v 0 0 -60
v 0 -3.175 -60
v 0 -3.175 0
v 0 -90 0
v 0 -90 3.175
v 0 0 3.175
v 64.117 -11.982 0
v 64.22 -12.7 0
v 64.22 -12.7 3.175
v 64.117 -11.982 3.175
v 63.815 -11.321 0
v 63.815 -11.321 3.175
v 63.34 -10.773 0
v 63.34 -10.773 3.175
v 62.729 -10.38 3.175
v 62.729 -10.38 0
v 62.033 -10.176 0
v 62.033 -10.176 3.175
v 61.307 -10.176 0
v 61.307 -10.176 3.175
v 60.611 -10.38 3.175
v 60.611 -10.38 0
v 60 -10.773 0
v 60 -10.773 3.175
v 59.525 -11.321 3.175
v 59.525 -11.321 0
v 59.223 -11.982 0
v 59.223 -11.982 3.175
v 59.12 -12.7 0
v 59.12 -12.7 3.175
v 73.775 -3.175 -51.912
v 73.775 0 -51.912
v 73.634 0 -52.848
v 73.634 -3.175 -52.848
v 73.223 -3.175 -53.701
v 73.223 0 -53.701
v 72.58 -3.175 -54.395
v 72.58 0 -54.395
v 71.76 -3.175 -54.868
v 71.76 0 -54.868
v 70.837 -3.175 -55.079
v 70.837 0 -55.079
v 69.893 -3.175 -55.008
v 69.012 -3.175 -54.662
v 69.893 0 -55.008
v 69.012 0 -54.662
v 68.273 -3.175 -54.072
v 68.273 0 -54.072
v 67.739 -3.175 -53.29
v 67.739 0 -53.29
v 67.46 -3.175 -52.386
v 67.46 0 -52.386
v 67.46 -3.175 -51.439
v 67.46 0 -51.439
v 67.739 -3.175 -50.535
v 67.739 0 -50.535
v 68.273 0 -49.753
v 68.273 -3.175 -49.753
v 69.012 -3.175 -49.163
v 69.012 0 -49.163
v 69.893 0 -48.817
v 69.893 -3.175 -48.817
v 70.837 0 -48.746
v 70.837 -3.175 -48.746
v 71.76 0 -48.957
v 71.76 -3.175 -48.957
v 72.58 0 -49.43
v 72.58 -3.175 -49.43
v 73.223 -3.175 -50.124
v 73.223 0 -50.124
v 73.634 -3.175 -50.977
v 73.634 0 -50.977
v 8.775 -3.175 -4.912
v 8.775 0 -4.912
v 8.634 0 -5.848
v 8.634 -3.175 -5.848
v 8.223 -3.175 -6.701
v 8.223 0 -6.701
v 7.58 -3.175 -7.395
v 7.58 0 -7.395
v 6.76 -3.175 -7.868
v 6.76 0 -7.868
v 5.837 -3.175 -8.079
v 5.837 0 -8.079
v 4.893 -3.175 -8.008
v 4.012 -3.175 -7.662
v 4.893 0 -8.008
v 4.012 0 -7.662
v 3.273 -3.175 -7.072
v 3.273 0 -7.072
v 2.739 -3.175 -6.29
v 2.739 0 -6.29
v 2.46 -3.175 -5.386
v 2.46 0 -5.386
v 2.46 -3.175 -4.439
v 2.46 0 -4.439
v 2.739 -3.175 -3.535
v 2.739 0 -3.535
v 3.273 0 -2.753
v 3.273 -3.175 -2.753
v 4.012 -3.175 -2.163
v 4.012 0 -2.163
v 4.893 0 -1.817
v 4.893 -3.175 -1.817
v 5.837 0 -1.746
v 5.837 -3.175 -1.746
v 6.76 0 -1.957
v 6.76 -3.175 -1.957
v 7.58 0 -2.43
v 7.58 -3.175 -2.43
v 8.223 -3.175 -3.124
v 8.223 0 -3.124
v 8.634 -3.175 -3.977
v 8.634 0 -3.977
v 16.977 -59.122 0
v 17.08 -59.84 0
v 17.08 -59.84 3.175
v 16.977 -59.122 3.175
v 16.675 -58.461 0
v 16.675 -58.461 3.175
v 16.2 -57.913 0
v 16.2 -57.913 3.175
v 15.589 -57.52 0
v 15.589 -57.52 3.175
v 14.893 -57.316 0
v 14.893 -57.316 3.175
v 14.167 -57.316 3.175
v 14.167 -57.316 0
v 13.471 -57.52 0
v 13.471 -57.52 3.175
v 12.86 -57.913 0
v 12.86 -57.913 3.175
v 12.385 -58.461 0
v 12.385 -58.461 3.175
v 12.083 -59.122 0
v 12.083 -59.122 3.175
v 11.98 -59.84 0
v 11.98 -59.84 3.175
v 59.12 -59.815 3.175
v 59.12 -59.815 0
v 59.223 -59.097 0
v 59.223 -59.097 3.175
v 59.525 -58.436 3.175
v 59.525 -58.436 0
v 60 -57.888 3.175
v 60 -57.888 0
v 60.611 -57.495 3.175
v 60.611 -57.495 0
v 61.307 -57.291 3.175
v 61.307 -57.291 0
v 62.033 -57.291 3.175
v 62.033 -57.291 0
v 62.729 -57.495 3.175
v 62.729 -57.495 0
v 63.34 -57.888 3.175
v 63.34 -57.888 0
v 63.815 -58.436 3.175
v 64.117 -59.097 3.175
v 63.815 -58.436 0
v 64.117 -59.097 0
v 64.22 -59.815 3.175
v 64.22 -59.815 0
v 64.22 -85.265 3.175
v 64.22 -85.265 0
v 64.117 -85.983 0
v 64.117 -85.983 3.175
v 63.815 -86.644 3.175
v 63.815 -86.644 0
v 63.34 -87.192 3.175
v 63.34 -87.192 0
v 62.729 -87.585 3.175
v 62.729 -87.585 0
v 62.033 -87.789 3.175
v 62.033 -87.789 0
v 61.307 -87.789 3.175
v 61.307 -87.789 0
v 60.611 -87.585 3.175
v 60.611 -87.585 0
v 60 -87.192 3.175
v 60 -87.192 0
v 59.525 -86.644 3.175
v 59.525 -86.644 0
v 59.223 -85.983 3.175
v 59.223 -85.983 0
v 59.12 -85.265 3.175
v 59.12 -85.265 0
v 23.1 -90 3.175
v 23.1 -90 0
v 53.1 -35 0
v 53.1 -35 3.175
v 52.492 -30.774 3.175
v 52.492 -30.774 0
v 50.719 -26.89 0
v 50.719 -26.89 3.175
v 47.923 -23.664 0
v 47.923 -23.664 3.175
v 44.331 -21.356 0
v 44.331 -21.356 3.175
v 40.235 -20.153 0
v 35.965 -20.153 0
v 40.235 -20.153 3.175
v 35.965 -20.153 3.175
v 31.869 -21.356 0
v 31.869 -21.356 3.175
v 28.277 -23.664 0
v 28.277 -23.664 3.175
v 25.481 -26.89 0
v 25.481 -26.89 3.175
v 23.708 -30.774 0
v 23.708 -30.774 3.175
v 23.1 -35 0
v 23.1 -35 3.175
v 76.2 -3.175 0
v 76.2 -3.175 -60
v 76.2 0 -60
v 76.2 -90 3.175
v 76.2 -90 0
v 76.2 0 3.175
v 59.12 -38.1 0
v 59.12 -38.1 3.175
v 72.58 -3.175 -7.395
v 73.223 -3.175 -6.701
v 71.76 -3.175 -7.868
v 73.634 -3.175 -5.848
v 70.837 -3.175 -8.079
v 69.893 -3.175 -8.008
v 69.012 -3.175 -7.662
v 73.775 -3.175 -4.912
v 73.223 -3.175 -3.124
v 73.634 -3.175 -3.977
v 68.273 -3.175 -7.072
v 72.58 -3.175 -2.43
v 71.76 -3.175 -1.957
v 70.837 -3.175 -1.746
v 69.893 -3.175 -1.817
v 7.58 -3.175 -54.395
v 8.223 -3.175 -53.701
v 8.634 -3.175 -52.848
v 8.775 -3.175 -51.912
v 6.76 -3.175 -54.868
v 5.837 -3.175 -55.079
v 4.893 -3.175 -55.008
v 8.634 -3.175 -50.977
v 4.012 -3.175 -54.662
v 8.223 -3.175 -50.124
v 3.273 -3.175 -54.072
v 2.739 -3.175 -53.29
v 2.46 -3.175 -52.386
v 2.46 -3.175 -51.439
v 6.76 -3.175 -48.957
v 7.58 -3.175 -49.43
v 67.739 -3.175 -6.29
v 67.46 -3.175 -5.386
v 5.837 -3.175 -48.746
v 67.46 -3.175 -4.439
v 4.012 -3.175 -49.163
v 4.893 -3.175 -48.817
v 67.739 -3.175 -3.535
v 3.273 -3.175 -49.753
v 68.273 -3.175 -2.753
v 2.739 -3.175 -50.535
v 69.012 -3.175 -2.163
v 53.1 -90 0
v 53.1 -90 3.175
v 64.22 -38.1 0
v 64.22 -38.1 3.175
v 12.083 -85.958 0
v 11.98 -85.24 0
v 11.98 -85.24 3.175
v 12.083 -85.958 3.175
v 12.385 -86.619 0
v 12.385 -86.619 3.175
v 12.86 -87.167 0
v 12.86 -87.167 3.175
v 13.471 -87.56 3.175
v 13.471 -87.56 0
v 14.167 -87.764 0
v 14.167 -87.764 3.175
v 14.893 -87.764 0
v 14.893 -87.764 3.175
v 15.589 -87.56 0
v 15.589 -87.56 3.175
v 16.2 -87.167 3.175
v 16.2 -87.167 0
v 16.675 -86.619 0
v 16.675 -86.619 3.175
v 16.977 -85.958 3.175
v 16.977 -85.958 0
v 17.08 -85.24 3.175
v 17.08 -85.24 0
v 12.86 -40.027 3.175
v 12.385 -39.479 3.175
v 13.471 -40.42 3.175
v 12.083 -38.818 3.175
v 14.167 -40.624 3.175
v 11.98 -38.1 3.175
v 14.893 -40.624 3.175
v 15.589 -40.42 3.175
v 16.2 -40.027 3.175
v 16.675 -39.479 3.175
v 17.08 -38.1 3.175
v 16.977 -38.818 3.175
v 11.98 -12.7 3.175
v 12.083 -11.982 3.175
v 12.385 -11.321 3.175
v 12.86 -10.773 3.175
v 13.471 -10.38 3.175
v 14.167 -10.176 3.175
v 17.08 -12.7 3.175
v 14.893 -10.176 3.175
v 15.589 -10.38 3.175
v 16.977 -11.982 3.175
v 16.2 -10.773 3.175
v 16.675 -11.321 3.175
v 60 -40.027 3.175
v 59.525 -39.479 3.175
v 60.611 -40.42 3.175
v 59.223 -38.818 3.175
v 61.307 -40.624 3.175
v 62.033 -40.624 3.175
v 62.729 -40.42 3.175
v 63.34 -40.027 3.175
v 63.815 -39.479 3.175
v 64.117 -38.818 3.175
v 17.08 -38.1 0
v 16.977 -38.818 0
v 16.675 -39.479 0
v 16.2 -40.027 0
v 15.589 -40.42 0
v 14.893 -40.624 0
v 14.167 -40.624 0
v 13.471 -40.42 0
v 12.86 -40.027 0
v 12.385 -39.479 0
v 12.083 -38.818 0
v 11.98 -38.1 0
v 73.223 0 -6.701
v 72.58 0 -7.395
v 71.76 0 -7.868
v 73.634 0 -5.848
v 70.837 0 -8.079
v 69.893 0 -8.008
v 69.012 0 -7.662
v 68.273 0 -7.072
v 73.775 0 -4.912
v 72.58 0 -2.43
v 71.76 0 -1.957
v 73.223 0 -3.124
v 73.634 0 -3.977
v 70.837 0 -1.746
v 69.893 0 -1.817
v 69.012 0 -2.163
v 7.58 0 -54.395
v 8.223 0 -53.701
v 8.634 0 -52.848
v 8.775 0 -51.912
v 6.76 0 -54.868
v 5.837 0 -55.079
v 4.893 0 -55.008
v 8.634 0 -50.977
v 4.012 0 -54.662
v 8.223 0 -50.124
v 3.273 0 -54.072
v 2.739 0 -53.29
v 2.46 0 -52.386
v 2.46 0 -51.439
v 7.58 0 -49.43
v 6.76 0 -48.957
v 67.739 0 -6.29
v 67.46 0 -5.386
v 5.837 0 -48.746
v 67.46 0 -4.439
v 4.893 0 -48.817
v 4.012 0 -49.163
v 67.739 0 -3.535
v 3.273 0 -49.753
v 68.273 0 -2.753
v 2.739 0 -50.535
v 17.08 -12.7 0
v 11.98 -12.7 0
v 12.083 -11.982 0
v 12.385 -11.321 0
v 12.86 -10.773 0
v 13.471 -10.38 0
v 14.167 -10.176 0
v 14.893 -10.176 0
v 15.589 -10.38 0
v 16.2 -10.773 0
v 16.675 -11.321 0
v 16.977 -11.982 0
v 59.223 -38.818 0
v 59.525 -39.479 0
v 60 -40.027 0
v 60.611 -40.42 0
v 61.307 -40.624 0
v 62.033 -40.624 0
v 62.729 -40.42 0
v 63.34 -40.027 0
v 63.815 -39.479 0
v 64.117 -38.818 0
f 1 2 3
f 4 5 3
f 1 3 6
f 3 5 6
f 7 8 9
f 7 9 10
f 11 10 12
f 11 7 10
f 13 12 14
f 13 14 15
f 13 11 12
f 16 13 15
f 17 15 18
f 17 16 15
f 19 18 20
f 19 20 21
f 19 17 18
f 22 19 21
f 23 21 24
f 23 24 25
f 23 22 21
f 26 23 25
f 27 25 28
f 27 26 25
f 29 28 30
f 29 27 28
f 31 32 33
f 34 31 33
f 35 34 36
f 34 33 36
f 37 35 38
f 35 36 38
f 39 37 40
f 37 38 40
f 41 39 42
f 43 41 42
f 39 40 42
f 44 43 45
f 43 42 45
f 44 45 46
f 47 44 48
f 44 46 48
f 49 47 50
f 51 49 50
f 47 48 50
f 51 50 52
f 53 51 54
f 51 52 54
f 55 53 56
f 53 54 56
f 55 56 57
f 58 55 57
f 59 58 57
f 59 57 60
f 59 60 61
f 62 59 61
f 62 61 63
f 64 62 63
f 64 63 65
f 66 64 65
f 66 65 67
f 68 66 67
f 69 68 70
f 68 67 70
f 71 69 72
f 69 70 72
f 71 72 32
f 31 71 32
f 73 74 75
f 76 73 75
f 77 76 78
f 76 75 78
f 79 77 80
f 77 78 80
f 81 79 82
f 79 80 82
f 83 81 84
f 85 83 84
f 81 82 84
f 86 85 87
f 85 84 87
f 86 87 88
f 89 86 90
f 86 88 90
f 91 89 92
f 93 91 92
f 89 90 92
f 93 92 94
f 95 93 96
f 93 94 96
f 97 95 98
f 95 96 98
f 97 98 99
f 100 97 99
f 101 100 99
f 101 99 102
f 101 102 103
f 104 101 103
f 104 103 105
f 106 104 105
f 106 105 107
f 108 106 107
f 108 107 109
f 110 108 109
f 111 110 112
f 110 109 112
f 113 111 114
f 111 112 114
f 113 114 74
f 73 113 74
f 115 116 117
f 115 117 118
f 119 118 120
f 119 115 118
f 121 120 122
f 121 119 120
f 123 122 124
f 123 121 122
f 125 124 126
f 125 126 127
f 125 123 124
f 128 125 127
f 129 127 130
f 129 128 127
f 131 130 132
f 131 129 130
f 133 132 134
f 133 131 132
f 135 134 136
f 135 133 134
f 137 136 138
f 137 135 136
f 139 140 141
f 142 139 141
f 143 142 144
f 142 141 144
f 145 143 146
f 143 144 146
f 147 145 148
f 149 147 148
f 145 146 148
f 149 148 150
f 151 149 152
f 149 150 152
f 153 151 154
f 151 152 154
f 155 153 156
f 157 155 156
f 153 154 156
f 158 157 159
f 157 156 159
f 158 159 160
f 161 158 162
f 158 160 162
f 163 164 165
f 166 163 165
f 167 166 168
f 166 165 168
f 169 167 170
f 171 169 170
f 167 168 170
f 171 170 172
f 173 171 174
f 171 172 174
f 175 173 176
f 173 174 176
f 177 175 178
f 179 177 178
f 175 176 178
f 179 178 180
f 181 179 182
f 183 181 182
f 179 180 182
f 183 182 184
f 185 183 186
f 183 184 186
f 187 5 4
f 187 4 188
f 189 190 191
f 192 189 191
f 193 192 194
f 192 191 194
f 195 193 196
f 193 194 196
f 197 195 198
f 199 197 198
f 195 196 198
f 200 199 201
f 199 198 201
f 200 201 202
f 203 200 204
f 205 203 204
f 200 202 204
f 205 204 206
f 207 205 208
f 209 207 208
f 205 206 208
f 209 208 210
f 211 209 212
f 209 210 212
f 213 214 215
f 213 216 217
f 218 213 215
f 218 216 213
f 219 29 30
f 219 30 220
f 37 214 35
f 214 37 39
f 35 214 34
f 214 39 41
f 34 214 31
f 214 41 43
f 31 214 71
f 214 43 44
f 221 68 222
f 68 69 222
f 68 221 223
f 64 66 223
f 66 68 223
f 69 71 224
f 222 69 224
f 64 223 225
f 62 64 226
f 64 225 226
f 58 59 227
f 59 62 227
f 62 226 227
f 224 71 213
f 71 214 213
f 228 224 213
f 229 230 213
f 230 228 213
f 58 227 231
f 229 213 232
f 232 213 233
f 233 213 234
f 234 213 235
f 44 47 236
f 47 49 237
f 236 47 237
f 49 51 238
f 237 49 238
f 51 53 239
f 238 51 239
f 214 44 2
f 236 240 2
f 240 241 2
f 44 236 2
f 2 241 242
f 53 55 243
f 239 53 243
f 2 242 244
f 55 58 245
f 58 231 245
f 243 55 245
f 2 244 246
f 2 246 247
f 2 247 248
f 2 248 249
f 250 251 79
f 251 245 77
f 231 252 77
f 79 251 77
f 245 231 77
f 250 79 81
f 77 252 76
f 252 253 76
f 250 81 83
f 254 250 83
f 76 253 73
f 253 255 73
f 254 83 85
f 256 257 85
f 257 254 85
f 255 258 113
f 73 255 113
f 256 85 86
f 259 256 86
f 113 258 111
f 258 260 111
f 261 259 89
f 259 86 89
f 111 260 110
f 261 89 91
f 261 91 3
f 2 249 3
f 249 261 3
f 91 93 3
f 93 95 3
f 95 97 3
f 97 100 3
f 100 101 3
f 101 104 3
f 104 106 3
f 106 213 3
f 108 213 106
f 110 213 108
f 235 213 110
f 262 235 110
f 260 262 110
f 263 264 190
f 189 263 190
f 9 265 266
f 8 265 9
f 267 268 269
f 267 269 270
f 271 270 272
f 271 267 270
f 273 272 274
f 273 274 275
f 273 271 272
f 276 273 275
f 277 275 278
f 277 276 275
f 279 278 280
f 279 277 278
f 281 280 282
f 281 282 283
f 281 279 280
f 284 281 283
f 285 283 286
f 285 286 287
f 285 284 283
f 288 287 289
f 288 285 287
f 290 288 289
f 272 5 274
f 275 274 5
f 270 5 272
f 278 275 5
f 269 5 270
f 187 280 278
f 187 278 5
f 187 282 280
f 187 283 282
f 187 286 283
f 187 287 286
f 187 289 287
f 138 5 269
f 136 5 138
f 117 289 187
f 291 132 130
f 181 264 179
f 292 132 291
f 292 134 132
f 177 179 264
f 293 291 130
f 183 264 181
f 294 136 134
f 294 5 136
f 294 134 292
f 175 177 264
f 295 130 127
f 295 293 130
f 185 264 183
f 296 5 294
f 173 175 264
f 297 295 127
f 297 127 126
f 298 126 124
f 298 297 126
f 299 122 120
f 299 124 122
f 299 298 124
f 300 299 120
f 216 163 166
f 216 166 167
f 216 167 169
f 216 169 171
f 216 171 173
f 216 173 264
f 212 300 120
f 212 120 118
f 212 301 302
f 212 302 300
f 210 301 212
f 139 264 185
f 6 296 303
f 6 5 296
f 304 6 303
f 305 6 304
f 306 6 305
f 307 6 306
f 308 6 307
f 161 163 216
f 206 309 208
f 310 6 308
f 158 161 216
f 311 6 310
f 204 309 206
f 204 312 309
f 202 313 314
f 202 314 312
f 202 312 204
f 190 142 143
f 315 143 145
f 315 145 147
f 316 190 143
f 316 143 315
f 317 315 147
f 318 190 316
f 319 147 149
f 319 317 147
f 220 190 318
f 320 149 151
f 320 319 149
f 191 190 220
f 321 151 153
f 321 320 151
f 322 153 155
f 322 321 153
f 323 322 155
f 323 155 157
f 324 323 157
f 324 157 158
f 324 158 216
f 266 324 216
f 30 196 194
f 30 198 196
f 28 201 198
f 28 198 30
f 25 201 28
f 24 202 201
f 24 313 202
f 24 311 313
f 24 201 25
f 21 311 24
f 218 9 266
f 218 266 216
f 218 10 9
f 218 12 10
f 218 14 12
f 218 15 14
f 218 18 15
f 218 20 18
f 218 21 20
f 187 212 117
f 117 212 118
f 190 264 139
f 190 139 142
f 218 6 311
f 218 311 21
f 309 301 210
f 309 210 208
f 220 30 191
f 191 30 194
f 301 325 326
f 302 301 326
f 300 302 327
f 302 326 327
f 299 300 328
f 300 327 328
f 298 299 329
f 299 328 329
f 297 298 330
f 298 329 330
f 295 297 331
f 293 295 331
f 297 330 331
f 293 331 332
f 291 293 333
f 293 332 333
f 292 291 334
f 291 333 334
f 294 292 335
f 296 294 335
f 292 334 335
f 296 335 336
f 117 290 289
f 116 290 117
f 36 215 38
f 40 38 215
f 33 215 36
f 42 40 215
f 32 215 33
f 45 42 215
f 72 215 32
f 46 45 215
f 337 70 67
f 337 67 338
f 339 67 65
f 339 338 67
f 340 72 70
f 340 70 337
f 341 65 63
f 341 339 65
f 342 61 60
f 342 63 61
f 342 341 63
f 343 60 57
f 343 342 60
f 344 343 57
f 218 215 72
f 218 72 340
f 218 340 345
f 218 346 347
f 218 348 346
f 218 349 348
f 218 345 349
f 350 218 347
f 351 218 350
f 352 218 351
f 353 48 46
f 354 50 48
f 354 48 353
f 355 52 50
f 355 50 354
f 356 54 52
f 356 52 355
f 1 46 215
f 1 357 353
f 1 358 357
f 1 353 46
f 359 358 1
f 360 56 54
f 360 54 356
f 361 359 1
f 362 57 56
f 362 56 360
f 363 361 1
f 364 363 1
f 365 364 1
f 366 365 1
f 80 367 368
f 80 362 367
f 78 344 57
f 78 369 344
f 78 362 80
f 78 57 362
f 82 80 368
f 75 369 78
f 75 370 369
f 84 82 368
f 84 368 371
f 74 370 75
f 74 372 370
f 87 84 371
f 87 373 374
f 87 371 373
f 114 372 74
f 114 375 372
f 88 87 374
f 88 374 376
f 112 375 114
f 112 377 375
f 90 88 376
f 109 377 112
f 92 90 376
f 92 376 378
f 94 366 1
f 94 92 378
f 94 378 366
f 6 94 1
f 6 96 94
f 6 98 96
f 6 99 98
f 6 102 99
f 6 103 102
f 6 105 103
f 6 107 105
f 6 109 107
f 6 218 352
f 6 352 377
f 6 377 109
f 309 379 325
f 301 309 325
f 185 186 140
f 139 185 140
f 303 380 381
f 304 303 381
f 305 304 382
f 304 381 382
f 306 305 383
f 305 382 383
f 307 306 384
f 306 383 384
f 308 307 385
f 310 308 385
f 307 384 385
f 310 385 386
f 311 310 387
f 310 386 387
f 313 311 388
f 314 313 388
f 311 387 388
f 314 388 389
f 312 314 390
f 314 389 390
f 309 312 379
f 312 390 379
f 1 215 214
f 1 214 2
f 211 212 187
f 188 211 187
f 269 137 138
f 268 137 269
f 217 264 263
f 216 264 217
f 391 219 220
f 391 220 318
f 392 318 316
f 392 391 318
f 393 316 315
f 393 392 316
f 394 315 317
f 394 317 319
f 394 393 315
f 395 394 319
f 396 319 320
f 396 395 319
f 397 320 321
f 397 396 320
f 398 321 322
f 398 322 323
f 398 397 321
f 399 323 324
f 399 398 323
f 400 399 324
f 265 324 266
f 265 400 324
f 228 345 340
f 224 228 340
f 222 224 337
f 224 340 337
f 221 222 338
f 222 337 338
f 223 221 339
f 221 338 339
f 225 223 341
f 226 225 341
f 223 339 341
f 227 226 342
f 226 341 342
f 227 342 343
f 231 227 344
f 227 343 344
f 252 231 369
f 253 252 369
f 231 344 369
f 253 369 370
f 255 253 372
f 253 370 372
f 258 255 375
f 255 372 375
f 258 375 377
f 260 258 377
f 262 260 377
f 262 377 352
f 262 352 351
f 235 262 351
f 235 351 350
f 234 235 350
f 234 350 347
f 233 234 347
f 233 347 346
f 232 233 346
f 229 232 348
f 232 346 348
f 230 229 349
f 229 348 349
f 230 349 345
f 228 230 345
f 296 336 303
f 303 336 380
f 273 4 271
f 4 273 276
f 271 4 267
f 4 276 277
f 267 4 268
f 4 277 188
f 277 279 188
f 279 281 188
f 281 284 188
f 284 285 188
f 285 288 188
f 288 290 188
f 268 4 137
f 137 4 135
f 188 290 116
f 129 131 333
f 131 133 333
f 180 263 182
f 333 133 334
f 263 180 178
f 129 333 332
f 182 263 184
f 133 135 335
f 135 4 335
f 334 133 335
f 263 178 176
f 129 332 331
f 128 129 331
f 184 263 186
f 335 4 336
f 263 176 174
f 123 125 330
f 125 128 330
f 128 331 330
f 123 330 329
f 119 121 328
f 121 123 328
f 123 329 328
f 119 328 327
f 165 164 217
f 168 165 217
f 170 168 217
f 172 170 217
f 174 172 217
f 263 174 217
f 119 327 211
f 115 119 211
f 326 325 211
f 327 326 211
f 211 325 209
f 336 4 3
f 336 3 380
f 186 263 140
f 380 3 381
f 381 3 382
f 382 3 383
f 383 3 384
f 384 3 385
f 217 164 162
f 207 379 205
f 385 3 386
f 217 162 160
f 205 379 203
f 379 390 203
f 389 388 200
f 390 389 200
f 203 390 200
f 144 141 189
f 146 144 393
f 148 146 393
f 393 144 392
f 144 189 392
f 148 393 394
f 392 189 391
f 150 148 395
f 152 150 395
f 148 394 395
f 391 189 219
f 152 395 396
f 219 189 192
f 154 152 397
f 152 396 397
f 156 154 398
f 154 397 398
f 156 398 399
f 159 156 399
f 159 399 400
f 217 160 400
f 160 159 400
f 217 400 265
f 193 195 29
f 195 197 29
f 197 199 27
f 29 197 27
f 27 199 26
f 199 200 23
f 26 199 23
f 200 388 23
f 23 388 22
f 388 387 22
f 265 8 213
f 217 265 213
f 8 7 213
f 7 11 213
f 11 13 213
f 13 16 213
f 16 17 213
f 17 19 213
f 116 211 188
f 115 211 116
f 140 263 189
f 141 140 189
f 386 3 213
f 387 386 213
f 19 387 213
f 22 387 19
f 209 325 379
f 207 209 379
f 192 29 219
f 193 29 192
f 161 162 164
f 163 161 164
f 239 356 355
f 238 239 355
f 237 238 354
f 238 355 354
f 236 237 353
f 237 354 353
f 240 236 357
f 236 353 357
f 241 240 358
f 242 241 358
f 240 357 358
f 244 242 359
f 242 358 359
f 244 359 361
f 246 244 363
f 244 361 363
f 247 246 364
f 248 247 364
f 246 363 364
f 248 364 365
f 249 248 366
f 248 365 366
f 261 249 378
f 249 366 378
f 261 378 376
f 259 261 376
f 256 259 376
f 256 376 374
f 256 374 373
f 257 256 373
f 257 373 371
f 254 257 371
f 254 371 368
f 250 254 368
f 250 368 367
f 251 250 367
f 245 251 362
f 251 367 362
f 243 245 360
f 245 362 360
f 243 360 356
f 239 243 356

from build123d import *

# Parameters (mm, degrees)
SKETCH1_W           = 76.2
SKETCH1_H           = 100
BOSS_EXTRUDE1_DEPTH = 3.175
CUT_EXTRUDE2_REACH  = 5.175
SKETCH4_W           = 76.2
SKETCH4_H           = 3.175
BOSS_EXTRUDE2_DEPTH = 60
SKETCH5_R           = 3.175
CUT_EXTRUDE3_DEPTH  = 3.175
SKETCH6_W           = 76.2
SKETCH6_H           = 10
CUT_EXTRUDE4_DEPTH  = 64.175


with BuildPart() as part:
    # Sketch1 → Boss-Extrude1 (new body)
    with BuildSketch(Plane.XY):
        with Locations((38.1, -50)):
            Rectangle(SKETCH1_W, SKETCH1_H)
        with BuildLine():
            Line((17.08, -12.7), (17.08, -38.1))
            ThreePointArc((17.08, -38.1), (14.53, -40.65), (11.98, -38.1))
            Line((11.98, -38.1), (11.98, -12.7))
            ThreePointArc((11.98, -12.7), (14.53, -10.15), (17.08, -12.7))
        make_face(mode=Mode.SUBTRACT)
        with BuildLine():
            Line((59.12, -12.7), (59.12, -38.1))
            ThreePointArc((59.12, -38.1), (61.67, -40.65), (64.22, -38.1))
            Line((64.22, -38.1), (64.22, -12.7))
            ThreePointArc((64.22, -12.7), (61.67, -10.15), (59.12, -12.7))
        make_face(mode=Mode.SUBTRACT)
        with BuildLine():
            Line((17.08, -85.24), (17.08, -59.84))
            ThreePointArc((17.08, -59.84), (14.53, -57.29), (11.98, -59.84))
            Line((11.98, -59.84), (11.98, -85.24))
            ThreePointArc((11.98, -85.24), (14.53, -87.79), (17.08, -85.24))
        make_face(mode=Mode.SUBTRACT)
        with BuildLine():
            Line((59.12, -85.265), (59.12, -59.815))
            ThreePointArc((59.12, -59.815), (61.67, -57.265), (64.22, -59.815))
            Line((64.22, -59.815), (64.22, -85.265))
            ThreePointArc((64.22, -85.265), (61.67, -87.815), (59.12, -85.265))
        make_face(mode=Mode.SUBTRACT)
    extrude(amount=BOSS_EXTRUDE1_DEPTH)

    # Sketch2 → Cut-Extrude2 (cut, up to next)
    with BuildSketch(Plane.XY.offset(3.175), mode=Mode.PRIVATE) as cut_extrude2_sk1:
        with BuildLine():
            Line((23.1, -35), (23.1, -100))
            Line((23.1, -100), (53.1, -100))
            Line((53.1, -100), (53.1, -35))
            ThreePointArc((53.1, -35), (38.1, -20), (23.1, -35))
        make_face()
    cut_extrude2_tool1 = extrude(cut_extrude2_sk1.sketch, amount=-CUT_EXTRUDE2_REACH, mode=Mode.PRIVATE) & part.part
    add(cut_extrude2_tool1.solids().sort_by_distance((38.1, -61.536522, 3.175))[0], mode=Mode.SUBTRACT)

    # Sketch4 → Boss-Extrude2 (add)
    with BuildSketch(Plane(origin=(0, 0, 0), x_dir=(-1, 0, 0), z_dir=(0, 0, -1))):
        with Locations((-38.1, -1.5875)):
            Rectangle(SKETCH4_W, SKETCH4_H)
    extrude(amount=BOSS_EXTRUDE2_DEPTH)

    # Sketch5 → Cut-Extrude3 (cut)
    with BuildSketch(Plane(origin=(0, 0, 0), x_dir=(1, 0, 0), z_dir=(0, 1, 0))):
        with Locations((5.6, 51.9125)):
            Circle(SKETCH5_R)
        with Locations((5.6, 4.9125)):
            Circle(SKETCH5_R)
        with Locations((70.6, 51.9125)):
            Circle(SKETCH5_R)
        with Locations((70.6, 4.9125)):
            Circle(SKETCH5_R)
    extrude(amount=-CUT_EXTRUDE3_DEPTH, mode=Mode.SUBTRACT)

    # Sketch6 → Cut-Extrude4 (cut, through all)
    with BuildSketch(Plane.XY.offset(3.175)):
        with Locations((38.1, -95)):
            Rectangle(SKETCH6_W, SKETCH6_H)
    extrude(amount=-CUT_EXTRUDE4_DEPTH, mode=Mode.SUBTRACT)


solid = part.part
